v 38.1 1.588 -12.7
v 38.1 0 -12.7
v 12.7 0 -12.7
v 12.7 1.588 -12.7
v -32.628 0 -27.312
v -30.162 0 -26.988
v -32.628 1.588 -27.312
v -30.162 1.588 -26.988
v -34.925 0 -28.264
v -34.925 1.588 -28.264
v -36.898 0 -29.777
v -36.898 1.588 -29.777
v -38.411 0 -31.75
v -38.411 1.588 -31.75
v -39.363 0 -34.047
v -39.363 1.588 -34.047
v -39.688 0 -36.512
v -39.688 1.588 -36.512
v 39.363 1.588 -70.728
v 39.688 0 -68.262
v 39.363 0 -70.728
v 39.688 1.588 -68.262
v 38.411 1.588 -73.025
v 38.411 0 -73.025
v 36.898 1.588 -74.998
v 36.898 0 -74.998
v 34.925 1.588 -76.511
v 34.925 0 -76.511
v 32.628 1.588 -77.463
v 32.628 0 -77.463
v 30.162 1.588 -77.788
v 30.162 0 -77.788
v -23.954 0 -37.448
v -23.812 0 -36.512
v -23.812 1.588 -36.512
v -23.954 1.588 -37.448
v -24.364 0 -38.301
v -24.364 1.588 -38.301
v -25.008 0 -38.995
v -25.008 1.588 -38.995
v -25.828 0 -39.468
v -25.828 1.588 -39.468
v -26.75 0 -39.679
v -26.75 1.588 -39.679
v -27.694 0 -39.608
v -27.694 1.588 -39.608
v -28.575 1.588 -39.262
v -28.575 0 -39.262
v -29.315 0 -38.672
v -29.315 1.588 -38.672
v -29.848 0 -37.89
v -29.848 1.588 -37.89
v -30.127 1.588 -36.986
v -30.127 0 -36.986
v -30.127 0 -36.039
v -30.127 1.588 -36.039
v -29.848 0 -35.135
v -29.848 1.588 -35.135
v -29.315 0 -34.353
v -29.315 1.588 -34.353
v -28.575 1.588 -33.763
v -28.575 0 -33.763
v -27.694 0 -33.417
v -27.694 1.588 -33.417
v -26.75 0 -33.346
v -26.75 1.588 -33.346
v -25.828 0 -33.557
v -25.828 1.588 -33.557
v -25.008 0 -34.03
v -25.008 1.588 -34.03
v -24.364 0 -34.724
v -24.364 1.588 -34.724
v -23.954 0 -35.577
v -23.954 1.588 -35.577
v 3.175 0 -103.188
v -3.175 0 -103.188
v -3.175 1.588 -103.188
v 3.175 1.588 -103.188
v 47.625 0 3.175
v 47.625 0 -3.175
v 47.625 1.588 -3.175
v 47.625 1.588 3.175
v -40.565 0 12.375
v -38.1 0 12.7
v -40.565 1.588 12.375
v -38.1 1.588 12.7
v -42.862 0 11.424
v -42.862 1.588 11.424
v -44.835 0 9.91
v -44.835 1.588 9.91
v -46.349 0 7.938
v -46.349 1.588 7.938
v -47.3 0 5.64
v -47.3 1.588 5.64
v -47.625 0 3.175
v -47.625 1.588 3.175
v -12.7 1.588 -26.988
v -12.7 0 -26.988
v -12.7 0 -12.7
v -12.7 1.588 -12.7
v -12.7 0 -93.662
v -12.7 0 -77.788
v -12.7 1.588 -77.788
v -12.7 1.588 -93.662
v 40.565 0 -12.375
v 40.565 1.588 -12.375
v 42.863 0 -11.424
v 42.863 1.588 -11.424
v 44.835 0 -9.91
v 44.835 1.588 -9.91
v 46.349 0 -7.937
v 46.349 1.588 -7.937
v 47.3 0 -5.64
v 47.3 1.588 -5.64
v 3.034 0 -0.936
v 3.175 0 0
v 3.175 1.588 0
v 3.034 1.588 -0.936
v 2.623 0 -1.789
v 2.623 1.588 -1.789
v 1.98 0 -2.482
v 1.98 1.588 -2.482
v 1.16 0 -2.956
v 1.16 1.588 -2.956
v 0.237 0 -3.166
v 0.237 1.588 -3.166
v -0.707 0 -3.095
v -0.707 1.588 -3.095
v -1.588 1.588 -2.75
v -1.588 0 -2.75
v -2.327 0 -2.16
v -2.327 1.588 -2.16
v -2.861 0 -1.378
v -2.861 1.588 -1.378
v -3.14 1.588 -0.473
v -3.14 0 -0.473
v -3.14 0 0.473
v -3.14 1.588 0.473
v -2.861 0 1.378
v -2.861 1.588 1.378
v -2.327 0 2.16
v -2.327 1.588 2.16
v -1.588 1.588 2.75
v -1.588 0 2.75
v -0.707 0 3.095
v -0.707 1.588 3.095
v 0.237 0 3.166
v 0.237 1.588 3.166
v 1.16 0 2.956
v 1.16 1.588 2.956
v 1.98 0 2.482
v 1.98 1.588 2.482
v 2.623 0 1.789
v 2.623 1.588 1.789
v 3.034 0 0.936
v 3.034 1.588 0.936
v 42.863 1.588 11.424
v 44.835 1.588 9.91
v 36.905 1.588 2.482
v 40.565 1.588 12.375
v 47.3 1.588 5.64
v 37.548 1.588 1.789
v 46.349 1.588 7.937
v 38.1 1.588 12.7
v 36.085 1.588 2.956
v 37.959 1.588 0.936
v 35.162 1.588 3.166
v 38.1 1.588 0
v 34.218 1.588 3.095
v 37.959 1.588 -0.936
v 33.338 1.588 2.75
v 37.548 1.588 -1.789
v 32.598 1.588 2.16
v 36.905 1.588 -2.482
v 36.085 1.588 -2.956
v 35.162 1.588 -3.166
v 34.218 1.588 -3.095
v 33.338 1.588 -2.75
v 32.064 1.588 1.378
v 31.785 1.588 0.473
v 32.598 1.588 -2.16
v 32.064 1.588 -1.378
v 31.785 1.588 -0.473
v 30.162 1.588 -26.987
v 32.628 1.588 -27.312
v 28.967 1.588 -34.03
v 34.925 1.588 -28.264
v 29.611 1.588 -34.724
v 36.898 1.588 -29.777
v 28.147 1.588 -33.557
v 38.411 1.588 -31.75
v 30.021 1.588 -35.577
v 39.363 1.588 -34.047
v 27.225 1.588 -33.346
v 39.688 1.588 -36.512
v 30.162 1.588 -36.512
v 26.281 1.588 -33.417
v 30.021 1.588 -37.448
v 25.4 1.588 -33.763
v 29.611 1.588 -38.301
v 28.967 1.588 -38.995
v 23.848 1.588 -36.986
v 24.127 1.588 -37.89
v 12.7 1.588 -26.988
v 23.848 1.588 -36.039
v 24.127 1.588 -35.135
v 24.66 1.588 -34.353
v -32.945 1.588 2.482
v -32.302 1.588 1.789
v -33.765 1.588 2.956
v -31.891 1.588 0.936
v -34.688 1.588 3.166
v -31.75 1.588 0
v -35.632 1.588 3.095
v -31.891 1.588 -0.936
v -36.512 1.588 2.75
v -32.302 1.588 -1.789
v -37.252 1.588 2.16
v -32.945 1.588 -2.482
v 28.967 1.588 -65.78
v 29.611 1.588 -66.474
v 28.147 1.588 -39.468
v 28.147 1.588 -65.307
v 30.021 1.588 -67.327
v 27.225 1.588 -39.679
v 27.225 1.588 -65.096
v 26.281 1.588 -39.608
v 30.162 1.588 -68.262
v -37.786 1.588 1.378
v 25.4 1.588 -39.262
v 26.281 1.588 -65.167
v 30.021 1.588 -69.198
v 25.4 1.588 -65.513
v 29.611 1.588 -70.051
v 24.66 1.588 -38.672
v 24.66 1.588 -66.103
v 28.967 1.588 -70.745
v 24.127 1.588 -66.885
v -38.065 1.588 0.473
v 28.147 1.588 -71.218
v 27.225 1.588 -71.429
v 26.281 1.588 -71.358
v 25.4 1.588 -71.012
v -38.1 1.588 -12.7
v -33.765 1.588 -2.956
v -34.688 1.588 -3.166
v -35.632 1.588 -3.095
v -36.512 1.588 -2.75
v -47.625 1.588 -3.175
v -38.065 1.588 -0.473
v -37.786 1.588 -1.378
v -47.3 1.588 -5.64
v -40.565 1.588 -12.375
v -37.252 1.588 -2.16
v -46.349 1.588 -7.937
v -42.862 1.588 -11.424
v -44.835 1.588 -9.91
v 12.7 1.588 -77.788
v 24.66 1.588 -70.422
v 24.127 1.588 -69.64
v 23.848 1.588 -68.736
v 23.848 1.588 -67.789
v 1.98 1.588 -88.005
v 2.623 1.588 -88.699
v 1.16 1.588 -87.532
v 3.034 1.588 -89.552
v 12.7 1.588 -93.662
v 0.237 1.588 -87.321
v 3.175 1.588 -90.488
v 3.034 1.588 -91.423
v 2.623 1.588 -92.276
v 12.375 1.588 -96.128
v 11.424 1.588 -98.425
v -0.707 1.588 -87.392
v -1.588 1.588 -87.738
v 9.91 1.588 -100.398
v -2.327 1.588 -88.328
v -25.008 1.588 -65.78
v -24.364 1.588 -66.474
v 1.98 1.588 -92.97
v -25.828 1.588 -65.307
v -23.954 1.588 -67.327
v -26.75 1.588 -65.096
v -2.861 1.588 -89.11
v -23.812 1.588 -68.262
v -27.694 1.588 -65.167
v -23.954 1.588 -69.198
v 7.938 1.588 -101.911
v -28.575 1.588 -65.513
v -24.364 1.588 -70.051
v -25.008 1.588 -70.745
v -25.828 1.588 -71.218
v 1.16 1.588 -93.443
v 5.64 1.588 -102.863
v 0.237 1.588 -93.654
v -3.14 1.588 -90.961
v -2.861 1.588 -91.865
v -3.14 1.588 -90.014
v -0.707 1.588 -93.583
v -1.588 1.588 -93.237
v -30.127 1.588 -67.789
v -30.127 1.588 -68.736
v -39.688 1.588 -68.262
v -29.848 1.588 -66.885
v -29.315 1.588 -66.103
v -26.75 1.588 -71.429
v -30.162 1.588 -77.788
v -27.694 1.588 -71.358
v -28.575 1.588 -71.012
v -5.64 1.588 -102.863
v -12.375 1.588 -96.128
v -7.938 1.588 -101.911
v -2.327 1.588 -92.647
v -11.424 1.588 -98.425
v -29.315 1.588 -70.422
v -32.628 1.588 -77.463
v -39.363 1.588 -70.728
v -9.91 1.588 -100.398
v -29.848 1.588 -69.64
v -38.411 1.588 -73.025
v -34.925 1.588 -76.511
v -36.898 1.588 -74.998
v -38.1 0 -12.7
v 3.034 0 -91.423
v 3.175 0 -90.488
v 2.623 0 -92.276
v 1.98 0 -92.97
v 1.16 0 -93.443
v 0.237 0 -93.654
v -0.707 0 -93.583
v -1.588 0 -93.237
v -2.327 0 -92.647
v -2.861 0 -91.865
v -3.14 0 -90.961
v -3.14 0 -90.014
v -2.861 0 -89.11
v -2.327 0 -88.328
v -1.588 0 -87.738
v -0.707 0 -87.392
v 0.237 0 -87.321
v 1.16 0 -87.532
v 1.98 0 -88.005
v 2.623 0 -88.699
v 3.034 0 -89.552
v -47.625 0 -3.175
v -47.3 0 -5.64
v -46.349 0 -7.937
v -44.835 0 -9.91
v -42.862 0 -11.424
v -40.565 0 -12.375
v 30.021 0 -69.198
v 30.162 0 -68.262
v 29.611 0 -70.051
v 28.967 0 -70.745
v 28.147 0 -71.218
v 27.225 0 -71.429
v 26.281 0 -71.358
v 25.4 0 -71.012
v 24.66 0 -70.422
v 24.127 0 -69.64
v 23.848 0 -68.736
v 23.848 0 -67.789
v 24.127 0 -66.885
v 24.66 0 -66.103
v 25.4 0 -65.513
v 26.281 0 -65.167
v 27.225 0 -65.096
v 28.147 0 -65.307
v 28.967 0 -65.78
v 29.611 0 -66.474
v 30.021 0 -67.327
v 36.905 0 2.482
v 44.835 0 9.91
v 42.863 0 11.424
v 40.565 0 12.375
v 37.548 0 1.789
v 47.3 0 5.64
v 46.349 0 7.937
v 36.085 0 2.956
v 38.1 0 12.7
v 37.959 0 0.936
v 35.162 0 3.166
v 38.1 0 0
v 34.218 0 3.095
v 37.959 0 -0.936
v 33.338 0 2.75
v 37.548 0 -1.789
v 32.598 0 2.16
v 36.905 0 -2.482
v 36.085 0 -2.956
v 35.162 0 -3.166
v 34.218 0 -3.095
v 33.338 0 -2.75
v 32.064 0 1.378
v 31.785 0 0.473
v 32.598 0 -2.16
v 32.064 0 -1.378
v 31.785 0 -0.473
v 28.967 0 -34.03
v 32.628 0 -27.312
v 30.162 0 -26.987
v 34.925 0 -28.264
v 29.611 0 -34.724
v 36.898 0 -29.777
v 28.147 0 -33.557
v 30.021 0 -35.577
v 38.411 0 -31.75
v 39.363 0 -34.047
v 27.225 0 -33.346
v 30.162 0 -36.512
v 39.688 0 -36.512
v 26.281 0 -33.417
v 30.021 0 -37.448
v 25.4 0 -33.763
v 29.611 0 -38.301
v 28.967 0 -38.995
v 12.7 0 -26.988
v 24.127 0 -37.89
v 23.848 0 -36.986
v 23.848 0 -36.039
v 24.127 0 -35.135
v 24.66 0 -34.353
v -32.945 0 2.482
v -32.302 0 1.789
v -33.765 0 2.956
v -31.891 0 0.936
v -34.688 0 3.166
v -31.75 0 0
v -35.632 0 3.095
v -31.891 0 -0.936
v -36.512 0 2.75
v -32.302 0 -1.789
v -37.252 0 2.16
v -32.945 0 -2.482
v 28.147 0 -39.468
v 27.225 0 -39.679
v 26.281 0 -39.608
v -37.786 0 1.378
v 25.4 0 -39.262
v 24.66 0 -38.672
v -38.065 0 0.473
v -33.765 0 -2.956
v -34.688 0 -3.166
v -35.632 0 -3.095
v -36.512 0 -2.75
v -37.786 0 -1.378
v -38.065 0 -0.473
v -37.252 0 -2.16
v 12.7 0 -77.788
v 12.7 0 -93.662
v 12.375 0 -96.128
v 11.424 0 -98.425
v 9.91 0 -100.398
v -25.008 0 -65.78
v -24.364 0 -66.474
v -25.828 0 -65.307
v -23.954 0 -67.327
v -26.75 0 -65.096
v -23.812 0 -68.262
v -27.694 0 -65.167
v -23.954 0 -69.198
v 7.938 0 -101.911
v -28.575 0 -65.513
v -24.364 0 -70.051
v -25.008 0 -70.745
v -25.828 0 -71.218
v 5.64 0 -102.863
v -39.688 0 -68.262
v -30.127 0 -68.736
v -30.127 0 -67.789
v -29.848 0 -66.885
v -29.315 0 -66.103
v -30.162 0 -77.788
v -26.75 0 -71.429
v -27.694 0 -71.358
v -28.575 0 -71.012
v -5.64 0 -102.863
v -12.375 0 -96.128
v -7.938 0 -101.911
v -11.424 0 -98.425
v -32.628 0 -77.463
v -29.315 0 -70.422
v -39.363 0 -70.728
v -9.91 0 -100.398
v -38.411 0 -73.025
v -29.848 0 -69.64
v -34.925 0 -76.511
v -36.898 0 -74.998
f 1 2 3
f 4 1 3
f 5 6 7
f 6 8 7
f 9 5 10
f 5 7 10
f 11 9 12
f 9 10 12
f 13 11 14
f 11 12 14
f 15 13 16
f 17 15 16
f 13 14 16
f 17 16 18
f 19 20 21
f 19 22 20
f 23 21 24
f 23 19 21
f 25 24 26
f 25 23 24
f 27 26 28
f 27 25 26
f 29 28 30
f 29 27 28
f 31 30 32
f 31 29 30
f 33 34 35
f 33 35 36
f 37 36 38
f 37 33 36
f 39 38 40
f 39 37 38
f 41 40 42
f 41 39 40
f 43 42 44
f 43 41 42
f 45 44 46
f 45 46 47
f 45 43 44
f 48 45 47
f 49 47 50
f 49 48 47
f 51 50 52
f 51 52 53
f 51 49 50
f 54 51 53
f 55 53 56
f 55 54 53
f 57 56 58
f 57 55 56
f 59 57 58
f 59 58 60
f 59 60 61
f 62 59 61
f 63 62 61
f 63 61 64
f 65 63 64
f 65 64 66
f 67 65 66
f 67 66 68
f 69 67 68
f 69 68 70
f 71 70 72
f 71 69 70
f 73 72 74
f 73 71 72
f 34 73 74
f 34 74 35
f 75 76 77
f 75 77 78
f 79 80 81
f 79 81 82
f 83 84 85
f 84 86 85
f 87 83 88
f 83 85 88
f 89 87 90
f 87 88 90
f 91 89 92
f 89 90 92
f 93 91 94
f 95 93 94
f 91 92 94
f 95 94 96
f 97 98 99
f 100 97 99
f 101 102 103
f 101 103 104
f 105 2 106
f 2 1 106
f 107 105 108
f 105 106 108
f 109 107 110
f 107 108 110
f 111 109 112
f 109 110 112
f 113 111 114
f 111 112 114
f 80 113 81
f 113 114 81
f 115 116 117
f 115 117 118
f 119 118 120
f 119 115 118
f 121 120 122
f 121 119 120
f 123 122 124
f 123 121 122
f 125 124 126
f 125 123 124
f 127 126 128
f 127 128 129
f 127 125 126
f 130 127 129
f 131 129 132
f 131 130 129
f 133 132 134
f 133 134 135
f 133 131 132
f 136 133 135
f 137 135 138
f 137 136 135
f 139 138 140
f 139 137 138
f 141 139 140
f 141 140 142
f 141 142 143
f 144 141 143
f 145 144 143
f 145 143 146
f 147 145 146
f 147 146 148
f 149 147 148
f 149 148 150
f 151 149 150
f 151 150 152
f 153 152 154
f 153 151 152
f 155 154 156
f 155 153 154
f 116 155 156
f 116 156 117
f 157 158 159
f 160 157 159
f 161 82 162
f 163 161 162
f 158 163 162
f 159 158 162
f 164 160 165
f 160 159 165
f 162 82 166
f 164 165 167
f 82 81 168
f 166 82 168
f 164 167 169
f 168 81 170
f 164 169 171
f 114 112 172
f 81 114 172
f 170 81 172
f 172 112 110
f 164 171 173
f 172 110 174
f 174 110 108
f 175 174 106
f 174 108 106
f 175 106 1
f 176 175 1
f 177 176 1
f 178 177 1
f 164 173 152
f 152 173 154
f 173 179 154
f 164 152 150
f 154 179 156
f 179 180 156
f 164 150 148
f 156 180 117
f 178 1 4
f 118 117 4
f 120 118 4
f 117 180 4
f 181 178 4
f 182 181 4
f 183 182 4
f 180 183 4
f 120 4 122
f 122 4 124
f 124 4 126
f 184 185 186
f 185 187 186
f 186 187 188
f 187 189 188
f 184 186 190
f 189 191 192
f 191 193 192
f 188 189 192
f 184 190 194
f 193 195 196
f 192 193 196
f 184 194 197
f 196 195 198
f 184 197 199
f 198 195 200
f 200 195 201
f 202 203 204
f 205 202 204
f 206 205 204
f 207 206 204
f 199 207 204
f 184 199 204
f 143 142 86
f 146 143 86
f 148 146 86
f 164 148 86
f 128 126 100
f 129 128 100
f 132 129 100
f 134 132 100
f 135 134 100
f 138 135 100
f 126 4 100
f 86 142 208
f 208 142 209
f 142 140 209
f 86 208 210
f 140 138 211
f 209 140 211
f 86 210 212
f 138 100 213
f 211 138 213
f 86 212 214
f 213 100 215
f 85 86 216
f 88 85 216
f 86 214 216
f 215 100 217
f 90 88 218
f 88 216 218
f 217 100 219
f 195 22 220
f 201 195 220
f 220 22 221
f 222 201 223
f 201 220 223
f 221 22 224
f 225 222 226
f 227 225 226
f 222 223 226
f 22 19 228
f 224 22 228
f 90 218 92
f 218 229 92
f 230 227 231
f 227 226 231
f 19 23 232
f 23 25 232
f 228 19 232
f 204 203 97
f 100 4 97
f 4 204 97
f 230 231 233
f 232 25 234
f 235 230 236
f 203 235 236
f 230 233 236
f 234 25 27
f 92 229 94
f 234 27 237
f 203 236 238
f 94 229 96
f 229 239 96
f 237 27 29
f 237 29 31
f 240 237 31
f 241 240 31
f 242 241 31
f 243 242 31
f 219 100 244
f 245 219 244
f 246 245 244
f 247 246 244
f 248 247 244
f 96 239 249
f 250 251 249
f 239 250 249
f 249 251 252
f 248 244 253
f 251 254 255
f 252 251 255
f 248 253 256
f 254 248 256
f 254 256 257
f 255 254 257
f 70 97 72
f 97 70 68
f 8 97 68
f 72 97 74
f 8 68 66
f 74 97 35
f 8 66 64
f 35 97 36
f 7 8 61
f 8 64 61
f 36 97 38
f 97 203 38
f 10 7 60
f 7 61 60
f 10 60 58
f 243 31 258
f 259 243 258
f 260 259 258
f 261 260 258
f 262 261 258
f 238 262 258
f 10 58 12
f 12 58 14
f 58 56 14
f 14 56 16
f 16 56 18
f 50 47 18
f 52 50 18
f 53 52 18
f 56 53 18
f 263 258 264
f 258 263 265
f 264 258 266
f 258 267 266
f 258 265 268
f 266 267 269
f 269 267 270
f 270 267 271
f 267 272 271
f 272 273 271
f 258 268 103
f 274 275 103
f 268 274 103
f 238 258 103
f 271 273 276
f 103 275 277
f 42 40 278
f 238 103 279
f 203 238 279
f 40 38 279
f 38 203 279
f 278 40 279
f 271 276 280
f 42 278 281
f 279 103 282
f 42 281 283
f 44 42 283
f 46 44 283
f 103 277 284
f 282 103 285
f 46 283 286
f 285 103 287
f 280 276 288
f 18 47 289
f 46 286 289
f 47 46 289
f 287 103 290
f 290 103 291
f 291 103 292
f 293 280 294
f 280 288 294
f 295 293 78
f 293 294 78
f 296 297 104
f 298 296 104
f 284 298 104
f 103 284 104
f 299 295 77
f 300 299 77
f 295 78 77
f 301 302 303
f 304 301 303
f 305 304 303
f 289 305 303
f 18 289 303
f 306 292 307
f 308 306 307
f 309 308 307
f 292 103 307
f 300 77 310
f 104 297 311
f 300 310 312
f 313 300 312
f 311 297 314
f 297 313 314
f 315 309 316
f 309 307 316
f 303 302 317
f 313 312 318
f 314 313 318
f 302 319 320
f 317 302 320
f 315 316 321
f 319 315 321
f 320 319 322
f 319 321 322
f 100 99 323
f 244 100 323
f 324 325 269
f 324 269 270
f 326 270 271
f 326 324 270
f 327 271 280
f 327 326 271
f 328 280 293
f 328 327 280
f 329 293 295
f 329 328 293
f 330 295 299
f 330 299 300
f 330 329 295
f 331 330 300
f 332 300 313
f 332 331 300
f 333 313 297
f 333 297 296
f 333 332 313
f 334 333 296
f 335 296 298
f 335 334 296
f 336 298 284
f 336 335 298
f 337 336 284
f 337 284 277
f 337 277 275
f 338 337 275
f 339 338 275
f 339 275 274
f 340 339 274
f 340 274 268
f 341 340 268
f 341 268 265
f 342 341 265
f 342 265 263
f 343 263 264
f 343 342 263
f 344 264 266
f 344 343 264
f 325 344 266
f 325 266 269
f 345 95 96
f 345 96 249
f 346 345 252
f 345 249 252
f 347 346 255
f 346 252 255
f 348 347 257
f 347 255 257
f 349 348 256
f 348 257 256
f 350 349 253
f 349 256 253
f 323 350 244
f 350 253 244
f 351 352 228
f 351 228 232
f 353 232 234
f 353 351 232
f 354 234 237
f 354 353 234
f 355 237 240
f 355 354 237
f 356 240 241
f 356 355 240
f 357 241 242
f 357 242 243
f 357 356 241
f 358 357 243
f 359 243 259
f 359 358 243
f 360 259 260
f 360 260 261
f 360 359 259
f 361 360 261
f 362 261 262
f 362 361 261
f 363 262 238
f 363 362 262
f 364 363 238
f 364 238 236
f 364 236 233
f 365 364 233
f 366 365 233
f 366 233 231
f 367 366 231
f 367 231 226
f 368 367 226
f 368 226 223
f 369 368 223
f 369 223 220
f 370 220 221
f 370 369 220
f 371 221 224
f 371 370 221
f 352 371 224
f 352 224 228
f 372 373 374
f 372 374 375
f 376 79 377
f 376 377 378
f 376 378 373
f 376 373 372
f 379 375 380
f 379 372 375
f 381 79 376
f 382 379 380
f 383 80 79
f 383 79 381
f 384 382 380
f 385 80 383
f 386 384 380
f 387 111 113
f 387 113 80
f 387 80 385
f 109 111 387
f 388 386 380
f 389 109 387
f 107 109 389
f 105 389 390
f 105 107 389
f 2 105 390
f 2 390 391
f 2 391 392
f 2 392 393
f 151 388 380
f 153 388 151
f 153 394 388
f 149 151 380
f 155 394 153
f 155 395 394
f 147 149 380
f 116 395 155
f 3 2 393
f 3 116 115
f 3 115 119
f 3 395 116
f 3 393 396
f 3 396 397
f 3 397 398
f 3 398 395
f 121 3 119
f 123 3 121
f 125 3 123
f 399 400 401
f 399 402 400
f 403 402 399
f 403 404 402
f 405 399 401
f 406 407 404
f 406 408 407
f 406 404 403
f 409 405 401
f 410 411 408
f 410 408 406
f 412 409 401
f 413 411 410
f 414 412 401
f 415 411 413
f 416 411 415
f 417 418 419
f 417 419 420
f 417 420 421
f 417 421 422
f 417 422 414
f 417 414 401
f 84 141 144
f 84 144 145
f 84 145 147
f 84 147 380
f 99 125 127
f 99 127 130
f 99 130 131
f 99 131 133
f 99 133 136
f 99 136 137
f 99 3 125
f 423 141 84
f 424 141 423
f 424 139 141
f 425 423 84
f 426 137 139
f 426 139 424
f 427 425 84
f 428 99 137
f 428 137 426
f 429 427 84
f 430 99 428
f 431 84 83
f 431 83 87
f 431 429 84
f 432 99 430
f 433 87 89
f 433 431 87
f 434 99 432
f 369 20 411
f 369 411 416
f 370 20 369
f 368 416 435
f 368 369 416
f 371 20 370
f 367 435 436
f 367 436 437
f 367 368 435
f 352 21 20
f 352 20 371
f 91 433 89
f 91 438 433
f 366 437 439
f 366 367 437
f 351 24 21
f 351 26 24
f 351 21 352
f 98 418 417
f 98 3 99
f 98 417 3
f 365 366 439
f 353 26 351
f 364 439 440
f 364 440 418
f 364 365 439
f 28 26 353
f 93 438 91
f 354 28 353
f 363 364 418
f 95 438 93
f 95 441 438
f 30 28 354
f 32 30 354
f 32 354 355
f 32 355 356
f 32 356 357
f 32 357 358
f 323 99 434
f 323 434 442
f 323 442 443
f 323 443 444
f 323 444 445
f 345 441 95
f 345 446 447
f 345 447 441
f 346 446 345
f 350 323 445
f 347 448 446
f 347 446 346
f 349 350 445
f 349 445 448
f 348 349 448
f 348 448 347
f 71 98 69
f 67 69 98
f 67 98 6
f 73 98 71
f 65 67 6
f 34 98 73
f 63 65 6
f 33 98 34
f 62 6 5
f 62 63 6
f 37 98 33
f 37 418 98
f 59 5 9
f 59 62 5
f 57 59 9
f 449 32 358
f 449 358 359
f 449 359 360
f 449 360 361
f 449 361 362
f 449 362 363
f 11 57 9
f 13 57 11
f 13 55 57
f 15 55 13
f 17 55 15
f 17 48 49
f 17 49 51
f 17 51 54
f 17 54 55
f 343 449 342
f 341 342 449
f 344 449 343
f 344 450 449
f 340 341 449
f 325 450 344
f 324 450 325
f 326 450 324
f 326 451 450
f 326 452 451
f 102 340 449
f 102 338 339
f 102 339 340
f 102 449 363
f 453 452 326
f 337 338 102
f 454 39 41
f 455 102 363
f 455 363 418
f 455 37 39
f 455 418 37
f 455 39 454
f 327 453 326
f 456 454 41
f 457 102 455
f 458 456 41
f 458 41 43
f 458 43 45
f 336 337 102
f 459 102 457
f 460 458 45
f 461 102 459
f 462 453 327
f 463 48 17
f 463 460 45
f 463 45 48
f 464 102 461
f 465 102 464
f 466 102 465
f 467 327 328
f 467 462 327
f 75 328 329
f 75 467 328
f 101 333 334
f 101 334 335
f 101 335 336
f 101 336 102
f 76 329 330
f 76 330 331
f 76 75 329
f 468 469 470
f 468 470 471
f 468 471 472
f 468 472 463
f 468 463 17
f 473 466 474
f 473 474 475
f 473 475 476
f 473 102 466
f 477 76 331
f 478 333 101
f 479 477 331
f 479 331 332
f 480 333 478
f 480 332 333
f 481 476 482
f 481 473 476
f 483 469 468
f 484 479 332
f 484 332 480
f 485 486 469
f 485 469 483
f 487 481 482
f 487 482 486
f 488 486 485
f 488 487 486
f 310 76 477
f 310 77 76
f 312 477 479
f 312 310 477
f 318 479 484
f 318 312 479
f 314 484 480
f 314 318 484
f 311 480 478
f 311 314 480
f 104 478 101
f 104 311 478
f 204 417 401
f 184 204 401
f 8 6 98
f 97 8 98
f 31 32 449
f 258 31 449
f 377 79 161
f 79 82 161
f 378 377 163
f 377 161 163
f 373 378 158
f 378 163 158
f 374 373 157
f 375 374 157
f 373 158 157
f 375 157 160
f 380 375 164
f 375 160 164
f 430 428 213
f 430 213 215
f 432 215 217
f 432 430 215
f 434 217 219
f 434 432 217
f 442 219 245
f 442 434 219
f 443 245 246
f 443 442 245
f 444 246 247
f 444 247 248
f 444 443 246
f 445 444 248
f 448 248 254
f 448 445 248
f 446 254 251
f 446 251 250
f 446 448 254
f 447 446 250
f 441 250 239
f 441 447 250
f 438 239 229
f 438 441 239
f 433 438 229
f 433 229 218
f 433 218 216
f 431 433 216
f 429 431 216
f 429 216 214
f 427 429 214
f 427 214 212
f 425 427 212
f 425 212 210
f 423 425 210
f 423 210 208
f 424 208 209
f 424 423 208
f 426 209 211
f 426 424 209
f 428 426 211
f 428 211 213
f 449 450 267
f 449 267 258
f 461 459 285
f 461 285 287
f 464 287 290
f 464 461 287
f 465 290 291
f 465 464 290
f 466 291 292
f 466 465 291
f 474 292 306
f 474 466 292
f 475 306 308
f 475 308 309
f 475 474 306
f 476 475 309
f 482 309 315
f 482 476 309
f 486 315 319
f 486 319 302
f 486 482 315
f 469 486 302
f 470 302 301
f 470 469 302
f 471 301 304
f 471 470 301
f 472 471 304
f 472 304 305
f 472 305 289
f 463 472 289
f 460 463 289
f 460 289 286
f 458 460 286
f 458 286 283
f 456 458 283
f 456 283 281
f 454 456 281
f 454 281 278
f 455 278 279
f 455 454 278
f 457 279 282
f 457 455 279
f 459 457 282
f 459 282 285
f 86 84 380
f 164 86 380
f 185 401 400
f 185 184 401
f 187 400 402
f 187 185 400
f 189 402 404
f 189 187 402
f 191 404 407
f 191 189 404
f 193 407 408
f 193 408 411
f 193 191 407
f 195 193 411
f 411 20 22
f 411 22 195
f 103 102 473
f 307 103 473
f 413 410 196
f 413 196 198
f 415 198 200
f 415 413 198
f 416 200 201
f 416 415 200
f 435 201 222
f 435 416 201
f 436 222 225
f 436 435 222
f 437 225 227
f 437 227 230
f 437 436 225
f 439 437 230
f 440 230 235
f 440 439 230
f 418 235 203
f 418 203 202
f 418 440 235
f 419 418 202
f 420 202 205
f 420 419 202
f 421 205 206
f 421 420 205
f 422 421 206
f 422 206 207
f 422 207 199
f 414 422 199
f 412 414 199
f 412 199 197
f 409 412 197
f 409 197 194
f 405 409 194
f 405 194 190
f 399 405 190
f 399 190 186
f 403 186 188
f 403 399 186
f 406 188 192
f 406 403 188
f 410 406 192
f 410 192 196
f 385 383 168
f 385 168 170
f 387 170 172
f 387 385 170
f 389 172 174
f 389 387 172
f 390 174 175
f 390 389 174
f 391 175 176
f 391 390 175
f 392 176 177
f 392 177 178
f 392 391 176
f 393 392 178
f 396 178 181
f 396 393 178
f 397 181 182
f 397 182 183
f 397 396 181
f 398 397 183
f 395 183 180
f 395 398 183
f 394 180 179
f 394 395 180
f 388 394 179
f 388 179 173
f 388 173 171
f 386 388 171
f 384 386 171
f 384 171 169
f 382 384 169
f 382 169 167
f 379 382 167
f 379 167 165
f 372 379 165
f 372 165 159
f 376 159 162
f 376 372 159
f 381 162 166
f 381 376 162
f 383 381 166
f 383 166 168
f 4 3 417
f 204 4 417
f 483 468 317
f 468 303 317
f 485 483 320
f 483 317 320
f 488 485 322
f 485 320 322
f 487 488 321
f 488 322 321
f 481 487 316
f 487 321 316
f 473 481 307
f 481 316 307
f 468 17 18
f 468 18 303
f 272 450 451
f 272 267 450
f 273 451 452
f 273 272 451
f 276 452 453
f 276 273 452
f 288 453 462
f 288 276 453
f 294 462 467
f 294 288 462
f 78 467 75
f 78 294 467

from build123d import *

# Parameters (mm, degrees)
SKETCH1_R           = 3.175
BOSS_EXTRUDE1_DEPTH = 1.5875
FILLET1_R           = 9.525


with BuildPart() as part:
    # Sketch1 → Boss-Extrude1 (new body)
    with BuildSketch(Plane(origin=(0, 0, 0), x_dir=(1, 0, 0), z_dir=(0, 1, 0))):
        Polygon((12.7, 12.7), (14.2875, 12.7), (20.6375, 12.7), (22.225, 12.7), (47.625, 12.7), (47.625, -12.7), (22.225, -12.7), (12.7, -12.7), (-12.7, -12.7), (-22.225, -12.7), (-47.625, -12.7), (-47.625, 12.7), (-22.225, 12.7), (-12.7, 12.7), (-12.7, 25.4), (-12.7, 26.9875), (-14.2875, 26.9875), (-39.6875, 26.9875), (-39.6875, 77.7875), (-14.2875, 77.7875), (-12.7, 77.7875), (-12.7, 103.1875), (12.7, 103.1875), (12.7, 77.7875), (14.2875, 77.7875), (39.6875, 77.7875), (39.6875, 26.9875), (14.2875, 26.9875), (12.7, 26.9875), (12.7, 25.4), align=None)
        with Locations((26.9875, 36.5125)):
            Circle(SKETCH1_R, mode=Mode.SUBTRACT)
        with Locations((26.9875, 68.2625)):
            Circle(SKETCH1_R, mode=Mode.SUBTRACT)
        with Locations((0, 90.4875)):
            Circle(SKETCH1_R, mode=Mode.SUBTRACT)
        with Locations((34.925, 0)):
            Circle(SKETCH1_R, mode=Mode.SUBTRACT)
        Circle(SKETCH1_R, mode=Mode.SUBTRACT)
        with Locations((-34.925, 0)):
            Circle(SKETCH1_R, mode=Mode.SUBTRACT)
        with Locations((-26.9875, 68.2625)):
            Circle(SKETCH1_R, mode=Mode.SUBTRACT)
        with Locations((-26.9875, 36.5125)):
            Circle(SKETCH1_R, mode=Mode.SUBTRACT)
    extrude(amount=BOSS_EXTRUDE1_DEPTH)

    # Fillet1
    fillet1_edges = [part.edges().sort_by_distance(p)[0] for p in [
        (47.625, 0.79375, -12.7),
        (47.625, 0.79375, 12.7),
        (-47.625, 0.79375, 12.7),
        (-47.625, 0.79375, -12.7),
        (-39.6875, 0.79375, -26.9875),
        (-39.6875, 0.79375, -77.7875),
        (-12.7, 0.79375, -103.1875),
        (12.7, 0.79375, -103.1875),
        (39.6875, 0.79375, -77.7875),
        (39.6875, 0.79375, -26.9875),
    ]]
    fillet(fillet1_edges, radius=FILLET1_R)


solid = part.part
